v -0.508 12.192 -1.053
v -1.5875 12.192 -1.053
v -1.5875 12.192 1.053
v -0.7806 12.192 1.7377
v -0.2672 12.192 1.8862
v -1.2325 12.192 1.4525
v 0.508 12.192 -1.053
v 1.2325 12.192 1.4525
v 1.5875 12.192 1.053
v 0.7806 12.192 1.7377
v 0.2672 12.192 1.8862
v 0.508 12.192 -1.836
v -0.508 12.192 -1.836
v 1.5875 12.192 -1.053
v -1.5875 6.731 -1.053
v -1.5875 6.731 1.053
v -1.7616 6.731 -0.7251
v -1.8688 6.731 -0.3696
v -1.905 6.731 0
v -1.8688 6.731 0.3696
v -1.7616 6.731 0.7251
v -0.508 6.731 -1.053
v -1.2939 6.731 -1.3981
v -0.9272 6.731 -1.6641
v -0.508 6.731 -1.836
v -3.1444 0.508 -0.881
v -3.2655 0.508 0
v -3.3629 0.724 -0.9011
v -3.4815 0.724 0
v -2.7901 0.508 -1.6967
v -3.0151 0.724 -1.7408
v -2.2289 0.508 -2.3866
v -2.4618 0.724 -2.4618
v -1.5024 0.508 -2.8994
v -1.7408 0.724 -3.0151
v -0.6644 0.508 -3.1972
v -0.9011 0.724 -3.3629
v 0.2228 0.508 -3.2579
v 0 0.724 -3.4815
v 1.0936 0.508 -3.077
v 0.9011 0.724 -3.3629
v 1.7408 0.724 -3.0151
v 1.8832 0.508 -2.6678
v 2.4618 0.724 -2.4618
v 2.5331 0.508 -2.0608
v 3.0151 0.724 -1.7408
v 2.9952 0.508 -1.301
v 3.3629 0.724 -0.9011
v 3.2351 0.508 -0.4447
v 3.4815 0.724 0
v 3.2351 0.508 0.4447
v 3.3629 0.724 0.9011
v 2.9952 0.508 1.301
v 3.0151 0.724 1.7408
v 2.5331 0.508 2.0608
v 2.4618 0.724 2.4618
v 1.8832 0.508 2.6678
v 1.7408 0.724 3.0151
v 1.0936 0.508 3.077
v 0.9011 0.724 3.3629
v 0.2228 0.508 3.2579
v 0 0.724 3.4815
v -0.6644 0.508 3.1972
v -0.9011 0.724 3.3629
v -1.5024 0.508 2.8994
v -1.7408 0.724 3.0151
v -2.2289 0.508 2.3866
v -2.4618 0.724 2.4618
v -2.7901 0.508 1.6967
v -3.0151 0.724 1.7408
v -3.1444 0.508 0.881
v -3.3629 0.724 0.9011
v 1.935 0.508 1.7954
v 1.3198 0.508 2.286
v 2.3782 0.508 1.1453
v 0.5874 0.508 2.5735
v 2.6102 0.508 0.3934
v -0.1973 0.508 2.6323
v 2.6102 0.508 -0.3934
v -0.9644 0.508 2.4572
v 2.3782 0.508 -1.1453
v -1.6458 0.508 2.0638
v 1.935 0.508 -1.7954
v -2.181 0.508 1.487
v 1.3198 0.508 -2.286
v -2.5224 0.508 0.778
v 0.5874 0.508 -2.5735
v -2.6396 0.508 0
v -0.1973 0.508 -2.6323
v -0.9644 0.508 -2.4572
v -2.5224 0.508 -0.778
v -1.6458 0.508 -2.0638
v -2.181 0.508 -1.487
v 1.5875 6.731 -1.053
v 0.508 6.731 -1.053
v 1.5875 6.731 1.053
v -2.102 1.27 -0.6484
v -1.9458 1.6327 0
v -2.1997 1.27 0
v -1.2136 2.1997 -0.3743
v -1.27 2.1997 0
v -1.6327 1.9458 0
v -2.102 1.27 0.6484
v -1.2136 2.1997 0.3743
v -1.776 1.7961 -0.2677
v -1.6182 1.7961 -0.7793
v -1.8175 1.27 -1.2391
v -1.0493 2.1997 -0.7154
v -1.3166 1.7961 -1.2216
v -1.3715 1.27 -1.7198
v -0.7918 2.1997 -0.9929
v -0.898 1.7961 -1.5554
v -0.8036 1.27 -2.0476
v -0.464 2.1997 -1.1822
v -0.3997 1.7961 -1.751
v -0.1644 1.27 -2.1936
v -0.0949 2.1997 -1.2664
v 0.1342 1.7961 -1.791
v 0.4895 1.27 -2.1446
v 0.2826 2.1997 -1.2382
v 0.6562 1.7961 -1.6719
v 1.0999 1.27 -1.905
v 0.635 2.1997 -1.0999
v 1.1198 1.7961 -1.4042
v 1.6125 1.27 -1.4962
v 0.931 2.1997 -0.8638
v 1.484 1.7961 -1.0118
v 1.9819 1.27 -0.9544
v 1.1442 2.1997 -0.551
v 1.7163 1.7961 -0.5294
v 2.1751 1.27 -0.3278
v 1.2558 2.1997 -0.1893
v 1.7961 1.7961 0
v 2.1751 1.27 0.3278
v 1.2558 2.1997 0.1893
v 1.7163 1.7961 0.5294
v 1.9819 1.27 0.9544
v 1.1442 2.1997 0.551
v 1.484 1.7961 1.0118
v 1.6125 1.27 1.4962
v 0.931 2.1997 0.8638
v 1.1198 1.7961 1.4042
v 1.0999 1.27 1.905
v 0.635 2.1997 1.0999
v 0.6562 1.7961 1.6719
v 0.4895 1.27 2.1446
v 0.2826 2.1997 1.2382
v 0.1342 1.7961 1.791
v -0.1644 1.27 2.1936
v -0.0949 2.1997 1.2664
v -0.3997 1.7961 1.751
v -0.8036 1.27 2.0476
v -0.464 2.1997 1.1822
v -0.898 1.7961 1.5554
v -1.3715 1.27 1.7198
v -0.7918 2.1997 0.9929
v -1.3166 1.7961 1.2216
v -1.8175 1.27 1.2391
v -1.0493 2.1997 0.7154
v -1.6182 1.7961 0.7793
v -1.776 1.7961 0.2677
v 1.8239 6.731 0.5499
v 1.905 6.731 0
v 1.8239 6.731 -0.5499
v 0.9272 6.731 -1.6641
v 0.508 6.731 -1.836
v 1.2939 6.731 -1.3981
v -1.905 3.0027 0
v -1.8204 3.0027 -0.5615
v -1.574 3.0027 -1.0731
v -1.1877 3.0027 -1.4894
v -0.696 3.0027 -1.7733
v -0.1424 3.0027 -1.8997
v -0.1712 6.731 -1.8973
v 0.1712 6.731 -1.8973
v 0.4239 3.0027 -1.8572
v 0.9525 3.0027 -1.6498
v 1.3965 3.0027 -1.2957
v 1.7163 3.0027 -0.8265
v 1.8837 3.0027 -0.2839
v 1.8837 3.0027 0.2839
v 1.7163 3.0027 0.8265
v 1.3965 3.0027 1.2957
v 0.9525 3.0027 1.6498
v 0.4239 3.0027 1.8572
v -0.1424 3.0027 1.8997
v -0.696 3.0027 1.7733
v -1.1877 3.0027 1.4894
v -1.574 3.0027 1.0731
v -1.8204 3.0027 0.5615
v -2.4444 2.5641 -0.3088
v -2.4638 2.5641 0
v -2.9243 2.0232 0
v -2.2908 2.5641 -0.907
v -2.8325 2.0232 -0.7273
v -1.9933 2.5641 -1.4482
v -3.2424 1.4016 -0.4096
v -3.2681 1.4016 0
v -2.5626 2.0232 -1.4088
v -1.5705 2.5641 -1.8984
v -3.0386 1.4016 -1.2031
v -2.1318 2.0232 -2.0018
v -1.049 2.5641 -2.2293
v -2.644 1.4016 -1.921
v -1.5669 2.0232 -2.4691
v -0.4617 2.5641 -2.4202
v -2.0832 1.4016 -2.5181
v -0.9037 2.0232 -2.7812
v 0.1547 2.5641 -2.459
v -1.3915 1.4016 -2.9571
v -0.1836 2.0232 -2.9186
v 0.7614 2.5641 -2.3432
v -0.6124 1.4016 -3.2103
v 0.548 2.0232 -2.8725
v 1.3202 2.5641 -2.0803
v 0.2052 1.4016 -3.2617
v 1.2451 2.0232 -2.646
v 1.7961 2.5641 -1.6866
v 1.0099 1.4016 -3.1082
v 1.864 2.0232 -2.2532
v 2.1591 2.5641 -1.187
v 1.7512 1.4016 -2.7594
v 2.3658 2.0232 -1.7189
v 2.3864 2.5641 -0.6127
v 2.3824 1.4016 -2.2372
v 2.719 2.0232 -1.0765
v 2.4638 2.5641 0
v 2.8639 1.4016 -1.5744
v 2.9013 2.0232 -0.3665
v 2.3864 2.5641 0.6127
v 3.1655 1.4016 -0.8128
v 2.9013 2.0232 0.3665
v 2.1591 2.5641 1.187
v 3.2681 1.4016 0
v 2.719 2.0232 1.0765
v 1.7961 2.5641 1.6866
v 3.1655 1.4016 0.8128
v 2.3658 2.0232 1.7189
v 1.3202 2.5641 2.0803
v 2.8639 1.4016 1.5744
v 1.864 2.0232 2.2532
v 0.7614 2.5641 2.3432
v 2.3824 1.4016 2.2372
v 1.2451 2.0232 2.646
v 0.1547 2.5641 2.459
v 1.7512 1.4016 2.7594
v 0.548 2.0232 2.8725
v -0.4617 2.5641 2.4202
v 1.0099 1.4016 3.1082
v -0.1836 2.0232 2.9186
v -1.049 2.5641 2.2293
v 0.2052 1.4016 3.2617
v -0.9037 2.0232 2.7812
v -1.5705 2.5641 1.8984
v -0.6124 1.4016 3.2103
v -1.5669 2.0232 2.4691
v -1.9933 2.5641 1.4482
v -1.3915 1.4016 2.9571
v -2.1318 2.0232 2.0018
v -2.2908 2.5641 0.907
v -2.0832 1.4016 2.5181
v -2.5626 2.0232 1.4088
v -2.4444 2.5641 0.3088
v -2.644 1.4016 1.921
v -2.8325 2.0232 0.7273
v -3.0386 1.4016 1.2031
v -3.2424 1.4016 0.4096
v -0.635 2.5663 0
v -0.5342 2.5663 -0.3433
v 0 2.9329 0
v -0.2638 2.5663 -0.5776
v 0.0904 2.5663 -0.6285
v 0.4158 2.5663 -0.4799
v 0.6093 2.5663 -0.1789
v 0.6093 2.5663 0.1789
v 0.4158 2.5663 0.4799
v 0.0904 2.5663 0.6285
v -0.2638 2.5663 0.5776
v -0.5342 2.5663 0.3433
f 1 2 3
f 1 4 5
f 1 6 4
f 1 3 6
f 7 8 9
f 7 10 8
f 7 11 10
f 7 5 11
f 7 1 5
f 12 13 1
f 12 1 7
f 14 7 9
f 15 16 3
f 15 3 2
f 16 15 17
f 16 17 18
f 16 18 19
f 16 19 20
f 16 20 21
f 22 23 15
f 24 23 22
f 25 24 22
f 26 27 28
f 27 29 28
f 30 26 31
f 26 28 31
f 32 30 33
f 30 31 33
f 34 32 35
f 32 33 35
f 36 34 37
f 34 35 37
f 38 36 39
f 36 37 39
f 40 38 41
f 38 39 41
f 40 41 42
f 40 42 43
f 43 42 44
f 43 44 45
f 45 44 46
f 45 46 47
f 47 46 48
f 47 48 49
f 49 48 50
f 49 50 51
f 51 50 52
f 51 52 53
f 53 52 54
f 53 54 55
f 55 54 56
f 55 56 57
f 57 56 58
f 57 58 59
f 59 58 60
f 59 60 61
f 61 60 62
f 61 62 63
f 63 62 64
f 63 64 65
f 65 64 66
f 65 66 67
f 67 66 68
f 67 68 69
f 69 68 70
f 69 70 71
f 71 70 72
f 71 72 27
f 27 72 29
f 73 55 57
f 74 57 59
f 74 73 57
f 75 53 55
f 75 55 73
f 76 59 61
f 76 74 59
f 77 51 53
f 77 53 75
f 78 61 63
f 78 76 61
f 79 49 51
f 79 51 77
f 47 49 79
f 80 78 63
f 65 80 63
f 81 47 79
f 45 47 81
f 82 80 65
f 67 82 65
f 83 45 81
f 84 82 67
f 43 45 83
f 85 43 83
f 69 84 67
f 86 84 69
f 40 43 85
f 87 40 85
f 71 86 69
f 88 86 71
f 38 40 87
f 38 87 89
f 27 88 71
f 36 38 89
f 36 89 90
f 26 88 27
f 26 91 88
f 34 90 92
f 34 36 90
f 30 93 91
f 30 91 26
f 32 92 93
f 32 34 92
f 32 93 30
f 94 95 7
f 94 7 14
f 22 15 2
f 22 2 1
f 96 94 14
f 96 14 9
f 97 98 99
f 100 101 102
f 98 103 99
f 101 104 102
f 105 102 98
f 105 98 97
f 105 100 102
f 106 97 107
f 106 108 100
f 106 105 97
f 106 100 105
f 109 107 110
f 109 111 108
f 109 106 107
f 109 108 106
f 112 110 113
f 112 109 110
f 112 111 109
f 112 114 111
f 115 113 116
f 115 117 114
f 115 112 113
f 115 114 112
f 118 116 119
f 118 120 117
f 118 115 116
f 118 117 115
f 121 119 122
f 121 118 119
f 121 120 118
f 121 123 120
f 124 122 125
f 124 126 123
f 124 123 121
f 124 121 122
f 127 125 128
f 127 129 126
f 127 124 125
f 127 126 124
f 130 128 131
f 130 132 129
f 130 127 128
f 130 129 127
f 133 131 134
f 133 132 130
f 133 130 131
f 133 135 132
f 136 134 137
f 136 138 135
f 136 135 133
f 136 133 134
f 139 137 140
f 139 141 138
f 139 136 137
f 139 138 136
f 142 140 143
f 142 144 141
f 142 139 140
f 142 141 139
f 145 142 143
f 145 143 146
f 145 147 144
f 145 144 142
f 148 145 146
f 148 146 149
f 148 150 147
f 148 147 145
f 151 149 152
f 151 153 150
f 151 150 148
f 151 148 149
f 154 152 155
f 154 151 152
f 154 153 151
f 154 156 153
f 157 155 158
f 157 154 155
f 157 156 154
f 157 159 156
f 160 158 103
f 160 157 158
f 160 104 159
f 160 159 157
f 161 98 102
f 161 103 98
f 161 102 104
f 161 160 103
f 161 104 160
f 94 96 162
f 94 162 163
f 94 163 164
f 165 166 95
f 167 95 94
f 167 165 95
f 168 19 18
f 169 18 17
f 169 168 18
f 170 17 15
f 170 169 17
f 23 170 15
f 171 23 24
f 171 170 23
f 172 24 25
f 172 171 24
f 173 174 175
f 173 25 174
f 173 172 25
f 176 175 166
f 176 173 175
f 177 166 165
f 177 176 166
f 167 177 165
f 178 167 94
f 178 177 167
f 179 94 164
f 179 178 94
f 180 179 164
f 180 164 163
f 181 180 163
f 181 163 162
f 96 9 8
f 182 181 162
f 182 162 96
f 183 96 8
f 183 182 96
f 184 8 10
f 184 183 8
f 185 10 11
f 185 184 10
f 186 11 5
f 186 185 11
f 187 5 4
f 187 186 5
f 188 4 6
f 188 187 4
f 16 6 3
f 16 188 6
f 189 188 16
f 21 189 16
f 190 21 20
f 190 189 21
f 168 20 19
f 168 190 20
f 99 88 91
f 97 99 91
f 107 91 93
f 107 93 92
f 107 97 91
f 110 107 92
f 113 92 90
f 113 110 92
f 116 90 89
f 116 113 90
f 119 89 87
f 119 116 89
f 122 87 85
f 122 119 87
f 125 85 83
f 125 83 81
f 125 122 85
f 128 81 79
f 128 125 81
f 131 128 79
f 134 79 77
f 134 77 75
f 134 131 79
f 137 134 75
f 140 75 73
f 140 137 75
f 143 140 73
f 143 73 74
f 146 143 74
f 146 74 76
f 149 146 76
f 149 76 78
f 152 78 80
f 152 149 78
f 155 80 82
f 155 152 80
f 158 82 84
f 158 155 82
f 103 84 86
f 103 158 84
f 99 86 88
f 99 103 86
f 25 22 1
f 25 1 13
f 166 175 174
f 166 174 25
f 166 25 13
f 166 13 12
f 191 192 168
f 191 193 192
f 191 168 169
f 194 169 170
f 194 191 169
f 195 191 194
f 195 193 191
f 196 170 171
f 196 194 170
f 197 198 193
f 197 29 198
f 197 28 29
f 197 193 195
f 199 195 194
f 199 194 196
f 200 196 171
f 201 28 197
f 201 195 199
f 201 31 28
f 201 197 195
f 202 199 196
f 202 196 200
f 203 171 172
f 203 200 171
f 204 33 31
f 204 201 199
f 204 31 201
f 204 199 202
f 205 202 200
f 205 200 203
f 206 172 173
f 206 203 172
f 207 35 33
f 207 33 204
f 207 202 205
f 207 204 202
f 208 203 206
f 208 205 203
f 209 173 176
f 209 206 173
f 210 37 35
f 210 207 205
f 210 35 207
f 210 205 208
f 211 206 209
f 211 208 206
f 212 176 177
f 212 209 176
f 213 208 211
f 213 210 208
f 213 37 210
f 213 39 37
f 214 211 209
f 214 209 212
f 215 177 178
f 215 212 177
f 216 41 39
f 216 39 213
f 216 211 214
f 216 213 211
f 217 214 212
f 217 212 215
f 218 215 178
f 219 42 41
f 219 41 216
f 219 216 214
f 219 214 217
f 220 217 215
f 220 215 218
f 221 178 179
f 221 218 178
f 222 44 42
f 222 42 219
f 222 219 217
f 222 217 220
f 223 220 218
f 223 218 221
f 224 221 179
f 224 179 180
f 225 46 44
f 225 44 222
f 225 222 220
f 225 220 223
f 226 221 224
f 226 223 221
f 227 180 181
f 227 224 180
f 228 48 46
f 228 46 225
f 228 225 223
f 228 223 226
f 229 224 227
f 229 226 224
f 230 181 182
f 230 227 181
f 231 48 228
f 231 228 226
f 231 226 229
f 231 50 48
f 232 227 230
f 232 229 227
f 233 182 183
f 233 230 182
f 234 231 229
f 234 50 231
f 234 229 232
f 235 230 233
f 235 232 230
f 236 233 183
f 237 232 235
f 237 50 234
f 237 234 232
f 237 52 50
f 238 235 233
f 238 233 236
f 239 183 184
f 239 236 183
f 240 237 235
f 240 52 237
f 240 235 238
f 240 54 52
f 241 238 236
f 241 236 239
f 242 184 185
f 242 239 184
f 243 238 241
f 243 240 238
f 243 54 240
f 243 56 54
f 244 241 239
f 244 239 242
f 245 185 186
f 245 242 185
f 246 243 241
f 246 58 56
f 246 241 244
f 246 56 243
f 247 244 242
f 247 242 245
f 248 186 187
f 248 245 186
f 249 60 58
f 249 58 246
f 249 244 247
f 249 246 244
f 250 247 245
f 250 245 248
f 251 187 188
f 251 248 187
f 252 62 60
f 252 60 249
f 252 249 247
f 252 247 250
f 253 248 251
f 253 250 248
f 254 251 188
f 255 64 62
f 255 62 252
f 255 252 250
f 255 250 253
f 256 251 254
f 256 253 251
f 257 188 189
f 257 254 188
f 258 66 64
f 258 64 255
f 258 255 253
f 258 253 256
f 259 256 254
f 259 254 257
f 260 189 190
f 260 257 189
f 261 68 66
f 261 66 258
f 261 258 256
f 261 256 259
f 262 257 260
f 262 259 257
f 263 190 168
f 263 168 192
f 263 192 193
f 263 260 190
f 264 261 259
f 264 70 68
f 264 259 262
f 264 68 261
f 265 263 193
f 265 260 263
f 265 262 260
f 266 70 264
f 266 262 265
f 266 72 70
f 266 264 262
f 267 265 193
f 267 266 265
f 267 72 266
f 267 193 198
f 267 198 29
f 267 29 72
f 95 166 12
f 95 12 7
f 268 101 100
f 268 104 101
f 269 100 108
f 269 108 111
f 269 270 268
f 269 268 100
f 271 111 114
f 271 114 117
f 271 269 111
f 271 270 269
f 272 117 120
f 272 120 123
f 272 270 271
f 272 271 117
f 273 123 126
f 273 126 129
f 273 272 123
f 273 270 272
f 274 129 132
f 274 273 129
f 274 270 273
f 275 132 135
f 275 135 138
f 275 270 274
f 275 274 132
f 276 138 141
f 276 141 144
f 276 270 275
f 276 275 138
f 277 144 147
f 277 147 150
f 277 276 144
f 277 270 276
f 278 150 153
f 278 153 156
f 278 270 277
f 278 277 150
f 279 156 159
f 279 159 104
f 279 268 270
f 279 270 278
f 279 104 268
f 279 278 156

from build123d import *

# Parameters (mm, degrees)
CUT_EXTRUDE1_START = -5.461
CUT_EXTRUDE1_DEPTH = 5.461
CHAMFER1_SIZE      = 0.254


with BuildPart() as part:
    # Sketch3 → Revolve1 (revolve)
    with BuildSketch(Plane.XY):
        with BuildLine():
            Line((0, 12.192), (-1.905, 12.192))
            Line((-1.905, 12.192), (-1.905, 3.002683966))
            ThreePointArc((-1.905, 3.002683966), (-2.985336827, 1.932071435), (-3.519527241, 0.508))
            Line((-3.519527241, 0.508), (-2.639645431, 0.508))
            Line((-2.639645431, 0.508), (-2.199704526, 1.27))
            ThreePointArc((-2.199704526, 1.27), (-1.796051224, 1.796051224), (-1.27, 2.199704526))
            Line((-1.27, 2.199704526), (0, 2.932939367))
            Line((0, 2.932939367), (0, 12.192))
        make_face()
    revolve(axis=Axis((0, 12.192, 0), (0, -1, 0)))

    # Sketch4 → Cut-Extrude1 (cut)
    with BuildSketch(Plane(origin=(0, 12.192, 0), x_dir=(1, 0, 0), z_dir=(0, 1, 0)).offset(CUT_EXTRUDE1_START)):
        with BuildLine():
            Line((1.5875, 1.053028371), (1.5875, -1.053028371))
            ThreePointArc((1.5875, -1.053028371), (1.905, 0), (1.5875, 1.053028371))
        make_face()
        with BuildLine():
            Line((0.508, 1.053028371), (1.5875, 1.053028371))
            ThreePointArc((1.5875, 1.053028371), (1.118502631, 1.542069021), (0.508, 1.836017701))
            Line((0.508, 1.836017701), (0.508, 1.053028371))
        make_face()
        with BuildLine():
            ThreePointArc((-1.5875, 1.053028371), (-1.905, 0), (-1.5875, -1.053028371))
            Line((-1.5875, -1.053028371), (-1.5875, 1.053028371))
        make_face()
        with BuildLine():
            Line((-0.508, 1.836017701), (0.508, 1.836017701))
            ThreePointArc((0.508, 1.836017701), (0, 1.905), (-0.508, 1.836017701))
        make_face()
        with BuildLine():
            ThreePointArc((-0.508, 1.836017701), (-1.118502631, 1.542069021), (-1.5875, 1.053028371))
            Line((-1.5875, 1.053028371), (-0.508, 1.053028371))
            Line((-0.508, 1.053028371), (-0.508, 1.836017701))
        make_face()
    extrude(amount=CUT_EXTRUDE1_DEPTH, mode=Mode.SUBTRACT)

    # Chamfer1
    # the kernel refuses this chamfer: 0.254, 0.224262667 mm, written as the material it takes off along each edge
    with BuildSketch(Plane(origin=(0, 0.508, 0), x_dir=(-1, 0, 0), z_dir=(0, 0, 1))) as chamfer1_piece_1:
        with BuildLine():
            Line((3.519527241 - CHAMFER1_SIZE, 0), (3.481518689, -0.215991448))
            ThreePointArc((3.481518689, -0.215991448), (3.501682417, -0.111157692), (3.519527241, 0))
            Line((3.519527241, 0), (3.519527241 - CHAMFER1_SIZE, 0))
        make_face()
    revolve(axis=Axis((0, 0.508, 0), (0, -1, 0)), mode=Mode.SUBTRACT)


solid = part.part
